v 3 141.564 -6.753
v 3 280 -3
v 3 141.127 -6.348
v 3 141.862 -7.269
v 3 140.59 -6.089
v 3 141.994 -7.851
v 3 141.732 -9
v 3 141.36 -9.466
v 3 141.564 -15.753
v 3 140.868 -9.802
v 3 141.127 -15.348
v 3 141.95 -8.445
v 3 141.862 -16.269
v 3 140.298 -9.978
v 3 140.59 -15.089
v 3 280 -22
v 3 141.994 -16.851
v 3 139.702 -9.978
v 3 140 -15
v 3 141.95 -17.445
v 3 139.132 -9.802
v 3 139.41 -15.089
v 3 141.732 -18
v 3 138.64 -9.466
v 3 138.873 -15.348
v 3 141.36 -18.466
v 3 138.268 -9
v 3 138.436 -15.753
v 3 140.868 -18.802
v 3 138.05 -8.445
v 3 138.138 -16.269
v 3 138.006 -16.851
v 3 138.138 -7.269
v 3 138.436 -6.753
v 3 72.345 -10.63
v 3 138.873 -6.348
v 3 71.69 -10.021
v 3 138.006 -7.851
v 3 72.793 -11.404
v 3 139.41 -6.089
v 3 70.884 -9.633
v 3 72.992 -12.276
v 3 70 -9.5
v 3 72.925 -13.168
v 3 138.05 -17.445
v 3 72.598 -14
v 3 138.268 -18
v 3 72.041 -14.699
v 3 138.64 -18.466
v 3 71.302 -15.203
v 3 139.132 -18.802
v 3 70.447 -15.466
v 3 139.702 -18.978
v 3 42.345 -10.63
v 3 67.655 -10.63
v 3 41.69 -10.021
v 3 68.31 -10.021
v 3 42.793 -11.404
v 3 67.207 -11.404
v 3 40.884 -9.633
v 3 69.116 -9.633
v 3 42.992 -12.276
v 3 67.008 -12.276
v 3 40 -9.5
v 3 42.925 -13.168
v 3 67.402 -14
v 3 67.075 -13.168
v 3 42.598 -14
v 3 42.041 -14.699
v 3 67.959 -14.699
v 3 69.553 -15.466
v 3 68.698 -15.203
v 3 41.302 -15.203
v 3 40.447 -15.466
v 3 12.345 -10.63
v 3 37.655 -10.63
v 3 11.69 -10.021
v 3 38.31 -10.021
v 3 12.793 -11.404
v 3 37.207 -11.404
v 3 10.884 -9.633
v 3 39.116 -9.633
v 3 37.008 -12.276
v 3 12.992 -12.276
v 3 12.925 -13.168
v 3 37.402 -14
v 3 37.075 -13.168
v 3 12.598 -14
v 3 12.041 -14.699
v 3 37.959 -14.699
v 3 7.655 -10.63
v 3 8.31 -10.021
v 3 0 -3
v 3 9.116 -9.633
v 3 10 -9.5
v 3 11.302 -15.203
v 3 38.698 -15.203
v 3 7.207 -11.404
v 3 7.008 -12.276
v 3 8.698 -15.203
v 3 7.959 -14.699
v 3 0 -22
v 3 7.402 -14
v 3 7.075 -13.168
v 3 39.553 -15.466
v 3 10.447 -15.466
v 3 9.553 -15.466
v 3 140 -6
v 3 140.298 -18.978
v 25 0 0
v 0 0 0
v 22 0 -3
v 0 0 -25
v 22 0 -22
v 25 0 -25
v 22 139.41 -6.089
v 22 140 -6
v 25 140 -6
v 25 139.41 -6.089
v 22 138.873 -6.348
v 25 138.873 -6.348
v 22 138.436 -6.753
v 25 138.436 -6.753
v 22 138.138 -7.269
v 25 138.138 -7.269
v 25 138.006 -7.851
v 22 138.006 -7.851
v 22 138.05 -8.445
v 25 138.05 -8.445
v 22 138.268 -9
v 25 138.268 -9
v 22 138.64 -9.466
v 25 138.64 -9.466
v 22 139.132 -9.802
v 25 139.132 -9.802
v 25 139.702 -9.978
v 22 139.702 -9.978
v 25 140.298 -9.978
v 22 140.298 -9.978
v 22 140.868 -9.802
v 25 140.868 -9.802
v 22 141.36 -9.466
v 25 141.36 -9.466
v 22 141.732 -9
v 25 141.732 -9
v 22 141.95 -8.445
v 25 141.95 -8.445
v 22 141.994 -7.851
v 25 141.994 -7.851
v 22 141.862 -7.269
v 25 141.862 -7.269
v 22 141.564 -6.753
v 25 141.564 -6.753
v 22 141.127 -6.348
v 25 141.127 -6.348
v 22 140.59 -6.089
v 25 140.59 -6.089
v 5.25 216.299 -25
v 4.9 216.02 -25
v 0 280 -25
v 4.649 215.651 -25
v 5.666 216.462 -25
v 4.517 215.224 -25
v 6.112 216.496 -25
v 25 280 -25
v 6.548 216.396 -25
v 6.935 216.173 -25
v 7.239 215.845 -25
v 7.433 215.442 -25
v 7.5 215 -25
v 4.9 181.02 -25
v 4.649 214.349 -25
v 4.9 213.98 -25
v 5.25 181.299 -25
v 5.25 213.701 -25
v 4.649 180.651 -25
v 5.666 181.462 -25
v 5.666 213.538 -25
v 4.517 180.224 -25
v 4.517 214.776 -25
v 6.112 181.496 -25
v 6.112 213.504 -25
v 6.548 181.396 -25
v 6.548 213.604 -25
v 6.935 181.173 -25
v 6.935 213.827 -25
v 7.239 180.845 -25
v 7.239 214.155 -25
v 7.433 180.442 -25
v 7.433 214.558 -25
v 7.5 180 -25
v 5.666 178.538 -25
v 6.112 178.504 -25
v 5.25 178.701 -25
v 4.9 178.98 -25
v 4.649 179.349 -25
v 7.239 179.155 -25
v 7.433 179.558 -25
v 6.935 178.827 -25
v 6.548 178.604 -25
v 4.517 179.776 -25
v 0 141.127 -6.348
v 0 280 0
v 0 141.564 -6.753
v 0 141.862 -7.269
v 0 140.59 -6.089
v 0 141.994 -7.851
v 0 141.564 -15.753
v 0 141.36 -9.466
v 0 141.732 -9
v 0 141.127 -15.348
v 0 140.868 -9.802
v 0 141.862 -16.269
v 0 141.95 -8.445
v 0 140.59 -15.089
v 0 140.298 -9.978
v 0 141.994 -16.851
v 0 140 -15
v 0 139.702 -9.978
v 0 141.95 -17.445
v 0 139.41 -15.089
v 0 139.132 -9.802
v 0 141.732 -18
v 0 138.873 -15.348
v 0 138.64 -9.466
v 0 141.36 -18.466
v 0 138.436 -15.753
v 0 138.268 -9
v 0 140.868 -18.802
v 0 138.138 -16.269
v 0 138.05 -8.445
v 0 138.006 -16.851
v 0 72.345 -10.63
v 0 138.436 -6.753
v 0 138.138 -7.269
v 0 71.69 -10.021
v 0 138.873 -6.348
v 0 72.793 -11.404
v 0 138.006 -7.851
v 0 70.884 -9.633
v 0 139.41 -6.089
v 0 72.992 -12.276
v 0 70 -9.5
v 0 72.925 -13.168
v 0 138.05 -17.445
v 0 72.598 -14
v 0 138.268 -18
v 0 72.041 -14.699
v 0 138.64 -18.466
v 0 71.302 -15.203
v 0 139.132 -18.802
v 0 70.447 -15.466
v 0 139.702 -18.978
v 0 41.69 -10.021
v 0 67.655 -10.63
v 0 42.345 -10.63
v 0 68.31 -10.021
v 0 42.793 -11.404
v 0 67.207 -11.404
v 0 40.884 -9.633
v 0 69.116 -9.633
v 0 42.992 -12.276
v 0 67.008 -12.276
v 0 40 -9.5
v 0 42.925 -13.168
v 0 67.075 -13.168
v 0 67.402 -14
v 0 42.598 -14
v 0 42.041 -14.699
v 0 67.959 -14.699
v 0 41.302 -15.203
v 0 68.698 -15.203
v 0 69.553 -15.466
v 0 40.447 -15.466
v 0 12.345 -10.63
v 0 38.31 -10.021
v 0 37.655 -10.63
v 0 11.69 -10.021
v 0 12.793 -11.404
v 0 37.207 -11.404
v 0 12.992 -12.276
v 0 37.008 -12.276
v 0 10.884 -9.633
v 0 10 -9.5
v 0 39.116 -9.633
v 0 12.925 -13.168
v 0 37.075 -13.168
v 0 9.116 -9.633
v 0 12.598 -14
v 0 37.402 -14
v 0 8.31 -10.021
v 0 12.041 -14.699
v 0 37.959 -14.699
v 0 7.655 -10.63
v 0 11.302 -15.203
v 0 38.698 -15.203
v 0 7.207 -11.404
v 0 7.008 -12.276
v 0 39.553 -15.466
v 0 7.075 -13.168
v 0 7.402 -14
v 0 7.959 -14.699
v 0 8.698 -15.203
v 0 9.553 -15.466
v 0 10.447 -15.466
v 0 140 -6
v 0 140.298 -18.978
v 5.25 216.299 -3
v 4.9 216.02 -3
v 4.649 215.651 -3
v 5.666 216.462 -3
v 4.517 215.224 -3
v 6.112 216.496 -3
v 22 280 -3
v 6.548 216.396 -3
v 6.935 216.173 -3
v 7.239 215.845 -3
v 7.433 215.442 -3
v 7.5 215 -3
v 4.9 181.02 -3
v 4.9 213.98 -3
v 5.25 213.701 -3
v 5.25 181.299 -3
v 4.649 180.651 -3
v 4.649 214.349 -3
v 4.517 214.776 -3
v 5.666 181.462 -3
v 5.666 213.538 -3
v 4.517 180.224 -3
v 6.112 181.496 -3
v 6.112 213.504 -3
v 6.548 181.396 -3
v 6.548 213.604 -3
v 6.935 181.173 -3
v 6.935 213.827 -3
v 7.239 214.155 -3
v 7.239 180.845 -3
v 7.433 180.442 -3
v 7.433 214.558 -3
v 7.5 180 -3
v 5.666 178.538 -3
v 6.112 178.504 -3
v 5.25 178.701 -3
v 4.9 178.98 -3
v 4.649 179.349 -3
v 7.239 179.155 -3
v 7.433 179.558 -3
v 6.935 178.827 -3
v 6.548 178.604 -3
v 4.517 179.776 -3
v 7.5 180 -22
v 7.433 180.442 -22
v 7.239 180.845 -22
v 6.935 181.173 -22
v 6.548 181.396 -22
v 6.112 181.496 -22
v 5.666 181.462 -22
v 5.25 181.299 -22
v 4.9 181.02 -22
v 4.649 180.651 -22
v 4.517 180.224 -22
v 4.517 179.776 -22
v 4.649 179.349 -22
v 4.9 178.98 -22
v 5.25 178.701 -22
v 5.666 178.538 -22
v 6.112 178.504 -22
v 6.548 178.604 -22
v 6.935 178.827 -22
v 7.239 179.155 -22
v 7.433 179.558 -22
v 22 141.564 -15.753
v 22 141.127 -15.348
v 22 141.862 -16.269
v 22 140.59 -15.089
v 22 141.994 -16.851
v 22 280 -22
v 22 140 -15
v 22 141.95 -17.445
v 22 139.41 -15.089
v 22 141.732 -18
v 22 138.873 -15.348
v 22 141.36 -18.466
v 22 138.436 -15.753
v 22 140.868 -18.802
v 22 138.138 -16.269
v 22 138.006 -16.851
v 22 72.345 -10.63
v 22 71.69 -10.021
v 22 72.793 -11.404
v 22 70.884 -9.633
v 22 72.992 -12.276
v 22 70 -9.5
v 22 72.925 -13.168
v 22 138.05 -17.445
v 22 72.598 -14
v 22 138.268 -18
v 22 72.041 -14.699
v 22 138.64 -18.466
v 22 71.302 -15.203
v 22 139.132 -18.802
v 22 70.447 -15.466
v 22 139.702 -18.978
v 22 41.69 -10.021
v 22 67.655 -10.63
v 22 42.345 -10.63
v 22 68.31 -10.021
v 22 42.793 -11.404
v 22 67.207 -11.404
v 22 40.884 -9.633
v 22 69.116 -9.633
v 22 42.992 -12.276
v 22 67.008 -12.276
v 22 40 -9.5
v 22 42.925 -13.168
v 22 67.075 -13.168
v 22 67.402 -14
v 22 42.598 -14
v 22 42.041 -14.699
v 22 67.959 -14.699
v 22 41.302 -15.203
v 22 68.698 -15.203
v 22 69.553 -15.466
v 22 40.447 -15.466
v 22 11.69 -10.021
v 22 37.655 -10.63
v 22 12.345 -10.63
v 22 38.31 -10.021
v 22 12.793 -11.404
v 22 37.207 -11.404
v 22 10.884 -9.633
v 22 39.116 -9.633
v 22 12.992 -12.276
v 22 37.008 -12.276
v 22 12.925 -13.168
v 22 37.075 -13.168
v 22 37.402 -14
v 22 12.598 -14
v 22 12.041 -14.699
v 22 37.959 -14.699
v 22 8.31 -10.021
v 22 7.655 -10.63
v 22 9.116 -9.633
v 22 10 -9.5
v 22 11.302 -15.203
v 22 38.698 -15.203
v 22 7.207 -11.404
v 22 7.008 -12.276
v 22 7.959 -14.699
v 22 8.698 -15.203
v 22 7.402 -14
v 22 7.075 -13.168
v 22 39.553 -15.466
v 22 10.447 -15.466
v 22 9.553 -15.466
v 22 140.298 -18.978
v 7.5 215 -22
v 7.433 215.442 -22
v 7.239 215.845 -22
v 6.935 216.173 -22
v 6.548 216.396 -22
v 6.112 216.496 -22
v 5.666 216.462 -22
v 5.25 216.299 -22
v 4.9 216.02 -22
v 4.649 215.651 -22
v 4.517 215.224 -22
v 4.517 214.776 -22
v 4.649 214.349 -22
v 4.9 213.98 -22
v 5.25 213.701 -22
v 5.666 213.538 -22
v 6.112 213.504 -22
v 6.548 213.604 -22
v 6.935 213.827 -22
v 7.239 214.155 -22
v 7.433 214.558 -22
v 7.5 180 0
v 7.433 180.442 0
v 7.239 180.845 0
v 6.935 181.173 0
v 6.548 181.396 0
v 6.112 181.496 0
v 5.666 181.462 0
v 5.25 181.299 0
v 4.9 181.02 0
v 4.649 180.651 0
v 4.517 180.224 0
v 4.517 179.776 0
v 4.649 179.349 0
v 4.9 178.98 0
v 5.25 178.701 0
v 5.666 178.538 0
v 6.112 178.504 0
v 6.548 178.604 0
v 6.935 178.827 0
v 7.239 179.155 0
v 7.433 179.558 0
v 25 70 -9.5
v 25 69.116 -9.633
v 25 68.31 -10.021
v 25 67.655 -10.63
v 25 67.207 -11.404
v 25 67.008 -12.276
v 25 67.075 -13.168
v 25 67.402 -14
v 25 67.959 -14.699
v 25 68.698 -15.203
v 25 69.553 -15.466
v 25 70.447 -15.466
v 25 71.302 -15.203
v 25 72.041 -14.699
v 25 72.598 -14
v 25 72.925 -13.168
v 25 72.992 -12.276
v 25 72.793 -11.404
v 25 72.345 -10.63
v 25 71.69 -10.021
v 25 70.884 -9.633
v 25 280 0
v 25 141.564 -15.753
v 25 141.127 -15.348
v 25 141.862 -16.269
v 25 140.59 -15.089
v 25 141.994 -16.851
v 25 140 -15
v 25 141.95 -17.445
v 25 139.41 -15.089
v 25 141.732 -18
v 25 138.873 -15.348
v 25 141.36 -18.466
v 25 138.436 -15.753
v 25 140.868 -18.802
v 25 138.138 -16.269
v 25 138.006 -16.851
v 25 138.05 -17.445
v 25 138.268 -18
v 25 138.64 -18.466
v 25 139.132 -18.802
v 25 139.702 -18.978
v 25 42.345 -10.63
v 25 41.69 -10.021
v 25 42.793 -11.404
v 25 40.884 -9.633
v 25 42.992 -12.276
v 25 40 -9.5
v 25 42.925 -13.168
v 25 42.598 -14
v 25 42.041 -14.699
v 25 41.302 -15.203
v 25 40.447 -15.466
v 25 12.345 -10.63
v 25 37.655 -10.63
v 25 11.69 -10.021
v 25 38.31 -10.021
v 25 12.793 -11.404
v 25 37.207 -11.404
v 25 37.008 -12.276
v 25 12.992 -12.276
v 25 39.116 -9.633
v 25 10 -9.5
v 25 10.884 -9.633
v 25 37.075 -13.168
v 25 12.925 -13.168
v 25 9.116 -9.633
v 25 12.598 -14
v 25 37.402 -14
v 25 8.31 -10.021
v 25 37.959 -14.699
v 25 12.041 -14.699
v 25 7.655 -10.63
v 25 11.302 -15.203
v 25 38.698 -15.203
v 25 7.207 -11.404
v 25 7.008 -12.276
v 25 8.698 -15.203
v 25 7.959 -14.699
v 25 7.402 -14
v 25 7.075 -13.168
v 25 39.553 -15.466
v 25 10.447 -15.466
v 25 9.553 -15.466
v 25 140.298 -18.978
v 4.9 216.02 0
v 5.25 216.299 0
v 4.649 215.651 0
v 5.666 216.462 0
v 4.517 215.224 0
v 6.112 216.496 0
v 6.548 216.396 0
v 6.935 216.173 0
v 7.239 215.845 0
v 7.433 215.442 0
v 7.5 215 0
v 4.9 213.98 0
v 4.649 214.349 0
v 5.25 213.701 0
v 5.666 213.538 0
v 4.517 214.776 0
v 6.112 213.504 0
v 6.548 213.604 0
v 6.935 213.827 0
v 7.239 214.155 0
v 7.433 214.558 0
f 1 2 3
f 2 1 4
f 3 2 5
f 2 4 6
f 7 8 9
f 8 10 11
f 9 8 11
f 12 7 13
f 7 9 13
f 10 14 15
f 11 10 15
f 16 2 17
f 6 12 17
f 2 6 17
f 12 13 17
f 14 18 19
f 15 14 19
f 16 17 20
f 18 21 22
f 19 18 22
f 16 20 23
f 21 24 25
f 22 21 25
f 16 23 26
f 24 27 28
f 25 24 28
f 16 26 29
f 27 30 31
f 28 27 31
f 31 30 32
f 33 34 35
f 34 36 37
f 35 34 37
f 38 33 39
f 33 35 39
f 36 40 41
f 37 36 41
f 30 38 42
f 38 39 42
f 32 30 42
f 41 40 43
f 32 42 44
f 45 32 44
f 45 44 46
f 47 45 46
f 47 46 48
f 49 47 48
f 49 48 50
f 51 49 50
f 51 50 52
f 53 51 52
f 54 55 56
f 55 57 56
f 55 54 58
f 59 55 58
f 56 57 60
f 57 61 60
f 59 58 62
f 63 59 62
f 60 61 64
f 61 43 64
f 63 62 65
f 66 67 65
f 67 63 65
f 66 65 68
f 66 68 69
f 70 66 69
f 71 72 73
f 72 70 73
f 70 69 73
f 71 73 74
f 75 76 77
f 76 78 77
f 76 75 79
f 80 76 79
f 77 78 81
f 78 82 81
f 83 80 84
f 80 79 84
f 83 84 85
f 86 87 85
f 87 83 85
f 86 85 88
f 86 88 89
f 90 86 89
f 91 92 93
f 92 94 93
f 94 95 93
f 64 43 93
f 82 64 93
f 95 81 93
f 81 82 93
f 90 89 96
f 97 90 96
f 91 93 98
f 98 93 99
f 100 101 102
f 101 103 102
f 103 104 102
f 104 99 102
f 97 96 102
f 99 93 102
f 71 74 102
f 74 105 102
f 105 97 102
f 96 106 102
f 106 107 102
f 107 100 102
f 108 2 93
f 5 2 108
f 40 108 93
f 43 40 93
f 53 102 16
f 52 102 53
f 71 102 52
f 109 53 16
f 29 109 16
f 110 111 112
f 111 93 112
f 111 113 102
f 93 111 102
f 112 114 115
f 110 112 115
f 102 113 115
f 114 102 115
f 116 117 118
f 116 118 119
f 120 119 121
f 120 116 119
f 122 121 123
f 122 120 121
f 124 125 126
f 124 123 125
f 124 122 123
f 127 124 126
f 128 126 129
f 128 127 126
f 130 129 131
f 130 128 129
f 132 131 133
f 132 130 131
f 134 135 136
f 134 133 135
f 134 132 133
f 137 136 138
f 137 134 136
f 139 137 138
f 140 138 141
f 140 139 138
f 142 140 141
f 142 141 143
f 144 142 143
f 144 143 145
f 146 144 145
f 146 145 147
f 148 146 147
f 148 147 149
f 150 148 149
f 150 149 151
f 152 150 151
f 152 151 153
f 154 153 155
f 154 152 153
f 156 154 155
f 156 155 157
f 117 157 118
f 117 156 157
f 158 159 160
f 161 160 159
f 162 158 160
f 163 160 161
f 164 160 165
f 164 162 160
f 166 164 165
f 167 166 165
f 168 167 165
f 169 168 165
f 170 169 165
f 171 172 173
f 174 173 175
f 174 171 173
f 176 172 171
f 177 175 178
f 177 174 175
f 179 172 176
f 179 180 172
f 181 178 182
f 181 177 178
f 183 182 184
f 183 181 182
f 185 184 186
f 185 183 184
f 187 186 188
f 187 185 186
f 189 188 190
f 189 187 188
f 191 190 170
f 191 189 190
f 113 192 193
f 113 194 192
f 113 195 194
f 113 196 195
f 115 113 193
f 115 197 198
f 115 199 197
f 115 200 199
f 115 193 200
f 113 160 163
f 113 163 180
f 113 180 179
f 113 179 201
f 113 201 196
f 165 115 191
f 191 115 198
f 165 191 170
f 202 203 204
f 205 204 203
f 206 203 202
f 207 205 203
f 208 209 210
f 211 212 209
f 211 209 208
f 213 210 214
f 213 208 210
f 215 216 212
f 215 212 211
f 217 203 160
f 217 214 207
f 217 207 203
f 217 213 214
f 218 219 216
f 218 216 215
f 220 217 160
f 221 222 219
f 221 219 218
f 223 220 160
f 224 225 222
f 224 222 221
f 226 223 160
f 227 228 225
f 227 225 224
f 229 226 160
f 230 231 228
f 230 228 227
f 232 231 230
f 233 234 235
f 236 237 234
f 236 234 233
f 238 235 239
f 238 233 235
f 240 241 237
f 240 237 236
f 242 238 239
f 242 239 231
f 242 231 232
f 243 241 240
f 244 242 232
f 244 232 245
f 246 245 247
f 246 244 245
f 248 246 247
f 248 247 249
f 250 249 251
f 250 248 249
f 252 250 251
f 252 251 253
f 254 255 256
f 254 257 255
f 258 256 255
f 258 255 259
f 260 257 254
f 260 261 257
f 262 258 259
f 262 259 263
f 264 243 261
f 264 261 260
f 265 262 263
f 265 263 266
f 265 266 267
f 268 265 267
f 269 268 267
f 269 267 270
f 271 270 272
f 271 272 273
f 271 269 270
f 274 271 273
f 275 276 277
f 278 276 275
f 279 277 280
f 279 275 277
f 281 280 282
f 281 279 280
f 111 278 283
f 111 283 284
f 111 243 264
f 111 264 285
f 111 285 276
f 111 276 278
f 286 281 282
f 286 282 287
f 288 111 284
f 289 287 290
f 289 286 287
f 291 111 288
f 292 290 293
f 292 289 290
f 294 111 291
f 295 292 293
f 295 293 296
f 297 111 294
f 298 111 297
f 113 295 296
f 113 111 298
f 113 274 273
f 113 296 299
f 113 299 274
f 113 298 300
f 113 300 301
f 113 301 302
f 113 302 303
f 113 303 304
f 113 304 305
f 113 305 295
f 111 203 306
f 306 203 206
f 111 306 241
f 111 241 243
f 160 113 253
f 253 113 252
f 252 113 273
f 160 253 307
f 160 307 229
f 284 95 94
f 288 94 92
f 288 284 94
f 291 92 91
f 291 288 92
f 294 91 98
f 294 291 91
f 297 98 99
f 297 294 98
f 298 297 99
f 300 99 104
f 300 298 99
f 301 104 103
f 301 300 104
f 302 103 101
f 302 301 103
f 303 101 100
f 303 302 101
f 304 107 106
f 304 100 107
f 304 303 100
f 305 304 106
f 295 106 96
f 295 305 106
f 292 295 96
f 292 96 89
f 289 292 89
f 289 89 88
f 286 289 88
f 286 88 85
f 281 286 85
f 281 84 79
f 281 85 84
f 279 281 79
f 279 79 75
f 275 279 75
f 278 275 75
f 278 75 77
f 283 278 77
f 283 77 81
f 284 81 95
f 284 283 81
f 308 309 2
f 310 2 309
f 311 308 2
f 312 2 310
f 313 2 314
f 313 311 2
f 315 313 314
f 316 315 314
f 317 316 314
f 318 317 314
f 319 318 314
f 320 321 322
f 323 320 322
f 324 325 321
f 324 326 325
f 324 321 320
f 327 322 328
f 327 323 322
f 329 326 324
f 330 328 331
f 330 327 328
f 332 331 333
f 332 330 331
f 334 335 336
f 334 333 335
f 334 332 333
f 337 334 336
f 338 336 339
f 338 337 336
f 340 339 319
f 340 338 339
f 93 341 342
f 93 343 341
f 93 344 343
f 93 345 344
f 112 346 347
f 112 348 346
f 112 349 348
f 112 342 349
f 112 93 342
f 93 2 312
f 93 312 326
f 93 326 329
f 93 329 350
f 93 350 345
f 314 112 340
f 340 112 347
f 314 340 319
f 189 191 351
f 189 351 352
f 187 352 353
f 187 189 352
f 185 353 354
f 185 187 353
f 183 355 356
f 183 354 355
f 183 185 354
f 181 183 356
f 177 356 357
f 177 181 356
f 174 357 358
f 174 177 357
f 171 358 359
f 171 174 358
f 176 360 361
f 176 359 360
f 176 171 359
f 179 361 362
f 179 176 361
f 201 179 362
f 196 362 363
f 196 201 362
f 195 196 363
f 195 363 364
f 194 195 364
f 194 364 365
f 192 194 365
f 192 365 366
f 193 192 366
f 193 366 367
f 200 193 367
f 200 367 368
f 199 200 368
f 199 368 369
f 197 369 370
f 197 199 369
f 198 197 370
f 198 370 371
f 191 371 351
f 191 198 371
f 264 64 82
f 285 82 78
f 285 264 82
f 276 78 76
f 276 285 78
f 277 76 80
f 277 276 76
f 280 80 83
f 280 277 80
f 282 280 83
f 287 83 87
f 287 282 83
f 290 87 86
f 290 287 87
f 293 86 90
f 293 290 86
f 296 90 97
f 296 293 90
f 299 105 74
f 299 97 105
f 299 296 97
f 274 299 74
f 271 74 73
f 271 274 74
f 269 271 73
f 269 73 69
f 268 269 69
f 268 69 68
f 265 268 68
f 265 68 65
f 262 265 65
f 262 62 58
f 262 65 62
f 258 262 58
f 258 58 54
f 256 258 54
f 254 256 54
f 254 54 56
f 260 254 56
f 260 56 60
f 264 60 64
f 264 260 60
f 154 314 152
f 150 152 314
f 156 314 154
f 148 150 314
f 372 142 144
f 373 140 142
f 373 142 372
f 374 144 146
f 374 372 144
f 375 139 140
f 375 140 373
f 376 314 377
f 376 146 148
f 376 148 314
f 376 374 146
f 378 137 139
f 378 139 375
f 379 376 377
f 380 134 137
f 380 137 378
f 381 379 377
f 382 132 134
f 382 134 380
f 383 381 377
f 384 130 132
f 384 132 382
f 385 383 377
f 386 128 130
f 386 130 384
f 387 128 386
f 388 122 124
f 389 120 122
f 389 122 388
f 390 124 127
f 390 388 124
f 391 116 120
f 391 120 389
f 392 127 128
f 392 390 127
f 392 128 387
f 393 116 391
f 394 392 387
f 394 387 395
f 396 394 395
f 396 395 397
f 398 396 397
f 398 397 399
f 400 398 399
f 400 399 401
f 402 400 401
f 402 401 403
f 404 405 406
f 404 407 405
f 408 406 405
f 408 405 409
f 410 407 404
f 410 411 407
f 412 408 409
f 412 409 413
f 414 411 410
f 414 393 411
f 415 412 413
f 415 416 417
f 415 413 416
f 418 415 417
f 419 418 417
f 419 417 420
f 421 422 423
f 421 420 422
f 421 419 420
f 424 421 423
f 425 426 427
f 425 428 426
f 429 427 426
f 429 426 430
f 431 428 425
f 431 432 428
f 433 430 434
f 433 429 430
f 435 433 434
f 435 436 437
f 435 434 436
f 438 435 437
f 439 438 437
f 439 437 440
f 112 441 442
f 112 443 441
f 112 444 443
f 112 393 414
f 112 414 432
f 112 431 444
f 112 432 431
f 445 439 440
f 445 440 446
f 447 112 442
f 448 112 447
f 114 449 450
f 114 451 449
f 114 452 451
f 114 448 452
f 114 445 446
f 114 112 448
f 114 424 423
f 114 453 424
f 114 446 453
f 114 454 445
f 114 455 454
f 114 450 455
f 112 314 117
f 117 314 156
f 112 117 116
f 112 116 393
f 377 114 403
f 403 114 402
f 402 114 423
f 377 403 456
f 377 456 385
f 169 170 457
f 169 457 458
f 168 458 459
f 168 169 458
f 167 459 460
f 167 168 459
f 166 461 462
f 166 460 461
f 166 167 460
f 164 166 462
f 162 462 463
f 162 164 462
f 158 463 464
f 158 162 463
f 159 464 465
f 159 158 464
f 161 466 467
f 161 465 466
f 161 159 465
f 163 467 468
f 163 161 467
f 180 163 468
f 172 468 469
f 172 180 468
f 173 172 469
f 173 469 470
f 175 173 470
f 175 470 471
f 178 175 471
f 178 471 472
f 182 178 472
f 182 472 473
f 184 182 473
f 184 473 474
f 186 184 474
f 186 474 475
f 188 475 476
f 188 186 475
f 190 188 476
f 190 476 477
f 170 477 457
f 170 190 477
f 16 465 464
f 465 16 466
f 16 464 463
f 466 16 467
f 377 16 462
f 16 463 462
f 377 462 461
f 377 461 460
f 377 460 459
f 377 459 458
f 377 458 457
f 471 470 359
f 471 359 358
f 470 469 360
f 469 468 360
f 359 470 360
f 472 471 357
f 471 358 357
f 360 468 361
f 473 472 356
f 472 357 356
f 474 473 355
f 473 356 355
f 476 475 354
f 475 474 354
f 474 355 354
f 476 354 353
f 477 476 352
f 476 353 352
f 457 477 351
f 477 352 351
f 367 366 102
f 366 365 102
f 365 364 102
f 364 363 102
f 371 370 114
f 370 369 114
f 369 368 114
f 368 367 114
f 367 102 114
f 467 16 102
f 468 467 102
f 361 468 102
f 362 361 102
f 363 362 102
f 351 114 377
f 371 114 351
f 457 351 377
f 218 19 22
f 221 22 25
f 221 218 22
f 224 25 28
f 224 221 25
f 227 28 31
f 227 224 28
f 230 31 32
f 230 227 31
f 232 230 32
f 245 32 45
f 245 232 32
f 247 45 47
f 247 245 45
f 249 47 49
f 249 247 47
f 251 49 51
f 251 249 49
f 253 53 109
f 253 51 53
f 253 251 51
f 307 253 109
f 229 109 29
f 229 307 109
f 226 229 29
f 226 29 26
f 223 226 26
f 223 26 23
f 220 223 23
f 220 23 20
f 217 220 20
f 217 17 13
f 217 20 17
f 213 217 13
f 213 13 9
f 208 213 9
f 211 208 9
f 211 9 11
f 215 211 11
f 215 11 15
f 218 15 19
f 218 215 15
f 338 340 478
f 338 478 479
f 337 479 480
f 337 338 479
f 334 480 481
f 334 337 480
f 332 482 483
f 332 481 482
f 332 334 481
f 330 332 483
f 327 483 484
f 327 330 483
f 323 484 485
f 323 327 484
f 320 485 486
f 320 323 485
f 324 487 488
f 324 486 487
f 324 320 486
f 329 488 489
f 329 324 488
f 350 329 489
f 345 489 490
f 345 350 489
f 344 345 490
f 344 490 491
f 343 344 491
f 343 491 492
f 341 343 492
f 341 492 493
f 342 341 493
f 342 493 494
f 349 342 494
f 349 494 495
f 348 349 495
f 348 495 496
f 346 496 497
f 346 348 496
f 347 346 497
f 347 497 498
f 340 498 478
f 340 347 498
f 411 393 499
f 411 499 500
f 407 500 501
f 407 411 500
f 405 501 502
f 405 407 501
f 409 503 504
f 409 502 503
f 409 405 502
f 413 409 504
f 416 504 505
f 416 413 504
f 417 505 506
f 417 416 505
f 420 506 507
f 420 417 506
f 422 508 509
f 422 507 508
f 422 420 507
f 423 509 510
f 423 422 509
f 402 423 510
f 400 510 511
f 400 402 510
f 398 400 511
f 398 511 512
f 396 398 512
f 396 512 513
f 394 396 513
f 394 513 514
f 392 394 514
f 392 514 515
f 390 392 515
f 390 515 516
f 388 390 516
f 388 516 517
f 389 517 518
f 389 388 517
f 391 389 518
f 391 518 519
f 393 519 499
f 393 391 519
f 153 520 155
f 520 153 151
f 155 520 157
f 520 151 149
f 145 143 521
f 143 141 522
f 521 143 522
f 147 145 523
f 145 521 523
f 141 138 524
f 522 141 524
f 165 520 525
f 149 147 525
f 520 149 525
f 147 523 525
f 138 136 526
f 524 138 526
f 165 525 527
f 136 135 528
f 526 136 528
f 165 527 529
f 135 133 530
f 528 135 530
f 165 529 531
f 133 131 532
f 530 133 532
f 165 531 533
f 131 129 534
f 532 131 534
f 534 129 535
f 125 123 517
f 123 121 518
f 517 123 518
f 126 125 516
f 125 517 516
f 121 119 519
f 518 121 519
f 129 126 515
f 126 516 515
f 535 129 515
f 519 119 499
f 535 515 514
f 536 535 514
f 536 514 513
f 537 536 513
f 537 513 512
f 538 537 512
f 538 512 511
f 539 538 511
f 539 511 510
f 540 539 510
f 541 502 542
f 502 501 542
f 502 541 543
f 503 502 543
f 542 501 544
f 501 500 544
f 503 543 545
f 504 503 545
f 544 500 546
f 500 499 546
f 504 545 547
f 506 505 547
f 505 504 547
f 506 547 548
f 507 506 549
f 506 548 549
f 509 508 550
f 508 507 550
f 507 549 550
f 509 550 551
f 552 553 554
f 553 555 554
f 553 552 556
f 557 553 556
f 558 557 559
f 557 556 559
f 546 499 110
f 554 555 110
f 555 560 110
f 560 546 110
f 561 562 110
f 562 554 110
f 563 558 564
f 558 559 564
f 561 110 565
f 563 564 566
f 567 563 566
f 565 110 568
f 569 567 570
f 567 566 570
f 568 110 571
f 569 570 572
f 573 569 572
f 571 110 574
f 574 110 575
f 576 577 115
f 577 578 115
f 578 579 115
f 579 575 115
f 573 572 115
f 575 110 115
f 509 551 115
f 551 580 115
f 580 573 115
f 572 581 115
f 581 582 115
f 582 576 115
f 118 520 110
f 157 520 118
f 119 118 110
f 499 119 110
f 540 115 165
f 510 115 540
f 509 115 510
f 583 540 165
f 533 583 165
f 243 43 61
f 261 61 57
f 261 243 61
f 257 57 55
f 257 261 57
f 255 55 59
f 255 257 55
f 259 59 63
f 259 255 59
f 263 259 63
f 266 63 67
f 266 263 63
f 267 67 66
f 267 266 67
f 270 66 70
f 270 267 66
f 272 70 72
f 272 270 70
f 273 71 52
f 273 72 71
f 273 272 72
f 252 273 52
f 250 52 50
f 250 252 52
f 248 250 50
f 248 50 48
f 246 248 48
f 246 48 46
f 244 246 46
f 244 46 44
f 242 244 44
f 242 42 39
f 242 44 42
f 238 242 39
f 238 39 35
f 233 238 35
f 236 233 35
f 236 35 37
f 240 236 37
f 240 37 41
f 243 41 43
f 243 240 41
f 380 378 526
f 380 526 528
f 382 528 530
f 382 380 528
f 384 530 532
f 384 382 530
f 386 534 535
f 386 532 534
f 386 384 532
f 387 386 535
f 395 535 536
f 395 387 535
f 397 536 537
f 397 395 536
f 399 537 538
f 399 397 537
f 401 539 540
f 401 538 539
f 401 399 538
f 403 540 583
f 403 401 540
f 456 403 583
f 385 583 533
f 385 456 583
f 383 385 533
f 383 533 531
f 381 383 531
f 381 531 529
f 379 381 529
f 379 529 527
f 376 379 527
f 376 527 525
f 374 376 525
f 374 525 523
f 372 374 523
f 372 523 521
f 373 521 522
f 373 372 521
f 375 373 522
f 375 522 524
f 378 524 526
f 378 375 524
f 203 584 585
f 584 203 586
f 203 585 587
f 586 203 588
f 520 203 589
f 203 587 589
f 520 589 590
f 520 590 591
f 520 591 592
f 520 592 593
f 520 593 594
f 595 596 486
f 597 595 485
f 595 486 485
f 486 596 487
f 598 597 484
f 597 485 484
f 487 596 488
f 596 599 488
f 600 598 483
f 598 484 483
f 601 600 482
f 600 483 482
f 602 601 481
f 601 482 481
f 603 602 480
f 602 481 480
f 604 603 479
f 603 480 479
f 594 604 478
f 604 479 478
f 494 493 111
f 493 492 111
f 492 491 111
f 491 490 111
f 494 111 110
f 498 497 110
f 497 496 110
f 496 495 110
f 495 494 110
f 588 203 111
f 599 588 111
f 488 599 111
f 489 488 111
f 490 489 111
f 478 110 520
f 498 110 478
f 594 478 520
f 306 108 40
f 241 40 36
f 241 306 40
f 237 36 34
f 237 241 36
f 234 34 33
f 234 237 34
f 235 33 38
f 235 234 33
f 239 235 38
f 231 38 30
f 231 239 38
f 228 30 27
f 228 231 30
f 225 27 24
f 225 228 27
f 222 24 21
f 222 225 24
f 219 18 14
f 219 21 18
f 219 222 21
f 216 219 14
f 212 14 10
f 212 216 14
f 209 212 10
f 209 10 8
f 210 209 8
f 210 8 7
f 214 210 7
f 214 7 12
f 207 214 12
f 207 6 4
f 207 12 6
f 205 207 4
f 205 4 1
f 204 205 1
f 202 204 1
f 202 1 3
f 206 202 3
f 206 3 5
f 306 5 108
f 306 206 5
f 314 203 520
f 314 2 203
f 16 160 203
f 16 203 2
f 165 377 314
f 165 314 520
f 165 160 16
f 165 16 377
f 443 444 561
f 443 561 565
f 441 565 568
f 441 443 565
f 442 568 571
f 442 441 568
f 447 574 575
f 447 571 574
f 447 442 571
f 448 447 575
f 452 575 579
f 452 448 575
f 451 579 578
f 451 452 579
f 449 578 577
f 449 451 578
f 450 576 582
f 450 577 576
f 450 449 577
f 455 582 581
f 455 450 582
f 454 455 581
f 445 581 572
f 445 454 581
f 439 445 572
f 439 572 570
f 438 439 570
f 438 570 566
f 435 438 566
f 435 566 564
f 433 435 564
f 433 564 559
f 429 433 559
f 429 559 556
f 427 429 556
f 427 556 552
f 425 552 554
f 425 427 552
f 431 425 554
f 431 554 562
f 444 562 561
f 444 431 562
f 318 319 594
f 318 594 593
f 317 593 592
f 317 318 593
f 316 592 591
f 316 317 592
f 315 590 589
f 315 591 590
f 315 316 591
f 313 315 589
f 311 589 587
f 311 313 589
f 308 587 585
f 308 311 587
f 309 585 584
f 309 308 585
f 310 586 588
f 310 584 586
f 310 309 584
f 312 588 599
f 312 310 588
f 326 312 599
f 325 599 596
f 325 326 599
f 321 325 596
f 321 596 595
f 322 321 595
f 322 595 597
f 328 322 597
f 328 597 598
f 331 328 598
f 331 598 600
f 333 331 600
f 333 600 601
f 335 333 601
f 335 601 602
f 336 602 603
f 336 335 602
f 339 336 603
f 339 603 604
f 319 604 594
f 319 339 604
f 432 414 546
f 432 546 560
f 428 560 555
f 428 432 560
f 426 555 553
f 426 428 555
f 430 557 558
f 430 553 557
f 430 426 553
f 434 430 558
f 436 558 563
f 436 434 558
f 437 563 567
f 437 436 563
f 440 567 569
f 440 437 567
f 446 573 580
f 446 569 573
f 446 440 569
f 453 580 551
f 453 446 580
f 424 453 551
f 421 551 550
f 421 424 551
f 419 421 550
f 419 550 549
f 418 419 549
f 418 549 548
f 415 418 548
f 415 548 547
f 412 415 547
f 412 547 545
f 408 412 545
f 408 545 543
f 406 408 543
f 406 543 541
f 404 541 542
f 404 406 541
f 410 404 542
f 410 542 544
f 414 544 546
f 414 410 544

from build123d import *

# Parameters (mm, degrees)
SKETCH_1_W               = 25
SKETCH_1_H               = 25
SKETCH_1_W_2             = 19
SKETCH_1_H_2             = 19
EXTRUDE_1_DEPTH          = 280
SKETCH_2_R               = 3
SKETCH_2_R_2             = 2
CUT_EXTRUDE_1_DEPTH      = 283.223315833
CUT_EXTRUDE_2_DEPTH      = 283.223315833
CUT_EXTRUDE_2_DEPTH_BACK = 283.223315833
SKETCH_3_R               = 1.5


with BuildPart() as part:
    # 草图1 → 凸台-拉伸1 (new body)
    with BuildSketch(Plane(origin=(0, 0, 0), x_dir=(1, 0, 0), z_dir=(0, 1, 0))):
        with Locations((12.5, 12.5)):
            Rectangle(SKETCH_1_W, SKETCH_1_H)
        with Locations((12.5, 12.5)):
            Rectangle(SKETCH_1_W_2, SKETCH_1_H_2, mode=Mode.SUBTRACT)
    extrude(amount=EXTRUDE_1_DEPTH)

    # 草图2 → 切除-拉伸1 (cut, through all)
    with BuildSketch(Plane(origin=(0, 0, 0), x_dir=(0, 0, -1), z_dir=(1, 0, 0))):
        with Locations(Location((12.5, 10, 0), (0, 0, 180))):
            Circle(SKETCH_2_R)
        with Locations(Location((12.5, 40, 0), (0, 0, 180))):
            Circle(SKETCH_2_R)
        with Locations(Location((12.5, 70, 0), (0, 0, 180))):
            Circle(SKETCH_2_R)
        with Locations(Location((17, 140, 0), (0, 0, 180))):
            Circle(SKETCH_2_R_2)
        with Locations(Location((8, 140, 0), (0, 0, 180))):
            Circle(SKETCH_2_R_2)
    extrude(amount=CUT_EXTRUDE_1_DEPTH, mode=Mode.SUBTRACT)

    # 草图3 → 切除-拉伸2 (cut, two sides: drawn at the far end of the back side and taken through both)
    with BuildSketch(Plane.XY.offset(-CUT_EXTRUDE_2_DEPTH_BACK)):
        with Locations((6, 180)):
            Circle(SKETCH_3_R)
        with Locations((6, 215)):
            Circle(SKETCH_3_R)
    extrude(amount=CUT_EXTRUDE_2_DEPTH + CUT_EXTRUDE_2_DEPTH_BACK, mode=Mode.SUBTRACT)


solid = part.part
